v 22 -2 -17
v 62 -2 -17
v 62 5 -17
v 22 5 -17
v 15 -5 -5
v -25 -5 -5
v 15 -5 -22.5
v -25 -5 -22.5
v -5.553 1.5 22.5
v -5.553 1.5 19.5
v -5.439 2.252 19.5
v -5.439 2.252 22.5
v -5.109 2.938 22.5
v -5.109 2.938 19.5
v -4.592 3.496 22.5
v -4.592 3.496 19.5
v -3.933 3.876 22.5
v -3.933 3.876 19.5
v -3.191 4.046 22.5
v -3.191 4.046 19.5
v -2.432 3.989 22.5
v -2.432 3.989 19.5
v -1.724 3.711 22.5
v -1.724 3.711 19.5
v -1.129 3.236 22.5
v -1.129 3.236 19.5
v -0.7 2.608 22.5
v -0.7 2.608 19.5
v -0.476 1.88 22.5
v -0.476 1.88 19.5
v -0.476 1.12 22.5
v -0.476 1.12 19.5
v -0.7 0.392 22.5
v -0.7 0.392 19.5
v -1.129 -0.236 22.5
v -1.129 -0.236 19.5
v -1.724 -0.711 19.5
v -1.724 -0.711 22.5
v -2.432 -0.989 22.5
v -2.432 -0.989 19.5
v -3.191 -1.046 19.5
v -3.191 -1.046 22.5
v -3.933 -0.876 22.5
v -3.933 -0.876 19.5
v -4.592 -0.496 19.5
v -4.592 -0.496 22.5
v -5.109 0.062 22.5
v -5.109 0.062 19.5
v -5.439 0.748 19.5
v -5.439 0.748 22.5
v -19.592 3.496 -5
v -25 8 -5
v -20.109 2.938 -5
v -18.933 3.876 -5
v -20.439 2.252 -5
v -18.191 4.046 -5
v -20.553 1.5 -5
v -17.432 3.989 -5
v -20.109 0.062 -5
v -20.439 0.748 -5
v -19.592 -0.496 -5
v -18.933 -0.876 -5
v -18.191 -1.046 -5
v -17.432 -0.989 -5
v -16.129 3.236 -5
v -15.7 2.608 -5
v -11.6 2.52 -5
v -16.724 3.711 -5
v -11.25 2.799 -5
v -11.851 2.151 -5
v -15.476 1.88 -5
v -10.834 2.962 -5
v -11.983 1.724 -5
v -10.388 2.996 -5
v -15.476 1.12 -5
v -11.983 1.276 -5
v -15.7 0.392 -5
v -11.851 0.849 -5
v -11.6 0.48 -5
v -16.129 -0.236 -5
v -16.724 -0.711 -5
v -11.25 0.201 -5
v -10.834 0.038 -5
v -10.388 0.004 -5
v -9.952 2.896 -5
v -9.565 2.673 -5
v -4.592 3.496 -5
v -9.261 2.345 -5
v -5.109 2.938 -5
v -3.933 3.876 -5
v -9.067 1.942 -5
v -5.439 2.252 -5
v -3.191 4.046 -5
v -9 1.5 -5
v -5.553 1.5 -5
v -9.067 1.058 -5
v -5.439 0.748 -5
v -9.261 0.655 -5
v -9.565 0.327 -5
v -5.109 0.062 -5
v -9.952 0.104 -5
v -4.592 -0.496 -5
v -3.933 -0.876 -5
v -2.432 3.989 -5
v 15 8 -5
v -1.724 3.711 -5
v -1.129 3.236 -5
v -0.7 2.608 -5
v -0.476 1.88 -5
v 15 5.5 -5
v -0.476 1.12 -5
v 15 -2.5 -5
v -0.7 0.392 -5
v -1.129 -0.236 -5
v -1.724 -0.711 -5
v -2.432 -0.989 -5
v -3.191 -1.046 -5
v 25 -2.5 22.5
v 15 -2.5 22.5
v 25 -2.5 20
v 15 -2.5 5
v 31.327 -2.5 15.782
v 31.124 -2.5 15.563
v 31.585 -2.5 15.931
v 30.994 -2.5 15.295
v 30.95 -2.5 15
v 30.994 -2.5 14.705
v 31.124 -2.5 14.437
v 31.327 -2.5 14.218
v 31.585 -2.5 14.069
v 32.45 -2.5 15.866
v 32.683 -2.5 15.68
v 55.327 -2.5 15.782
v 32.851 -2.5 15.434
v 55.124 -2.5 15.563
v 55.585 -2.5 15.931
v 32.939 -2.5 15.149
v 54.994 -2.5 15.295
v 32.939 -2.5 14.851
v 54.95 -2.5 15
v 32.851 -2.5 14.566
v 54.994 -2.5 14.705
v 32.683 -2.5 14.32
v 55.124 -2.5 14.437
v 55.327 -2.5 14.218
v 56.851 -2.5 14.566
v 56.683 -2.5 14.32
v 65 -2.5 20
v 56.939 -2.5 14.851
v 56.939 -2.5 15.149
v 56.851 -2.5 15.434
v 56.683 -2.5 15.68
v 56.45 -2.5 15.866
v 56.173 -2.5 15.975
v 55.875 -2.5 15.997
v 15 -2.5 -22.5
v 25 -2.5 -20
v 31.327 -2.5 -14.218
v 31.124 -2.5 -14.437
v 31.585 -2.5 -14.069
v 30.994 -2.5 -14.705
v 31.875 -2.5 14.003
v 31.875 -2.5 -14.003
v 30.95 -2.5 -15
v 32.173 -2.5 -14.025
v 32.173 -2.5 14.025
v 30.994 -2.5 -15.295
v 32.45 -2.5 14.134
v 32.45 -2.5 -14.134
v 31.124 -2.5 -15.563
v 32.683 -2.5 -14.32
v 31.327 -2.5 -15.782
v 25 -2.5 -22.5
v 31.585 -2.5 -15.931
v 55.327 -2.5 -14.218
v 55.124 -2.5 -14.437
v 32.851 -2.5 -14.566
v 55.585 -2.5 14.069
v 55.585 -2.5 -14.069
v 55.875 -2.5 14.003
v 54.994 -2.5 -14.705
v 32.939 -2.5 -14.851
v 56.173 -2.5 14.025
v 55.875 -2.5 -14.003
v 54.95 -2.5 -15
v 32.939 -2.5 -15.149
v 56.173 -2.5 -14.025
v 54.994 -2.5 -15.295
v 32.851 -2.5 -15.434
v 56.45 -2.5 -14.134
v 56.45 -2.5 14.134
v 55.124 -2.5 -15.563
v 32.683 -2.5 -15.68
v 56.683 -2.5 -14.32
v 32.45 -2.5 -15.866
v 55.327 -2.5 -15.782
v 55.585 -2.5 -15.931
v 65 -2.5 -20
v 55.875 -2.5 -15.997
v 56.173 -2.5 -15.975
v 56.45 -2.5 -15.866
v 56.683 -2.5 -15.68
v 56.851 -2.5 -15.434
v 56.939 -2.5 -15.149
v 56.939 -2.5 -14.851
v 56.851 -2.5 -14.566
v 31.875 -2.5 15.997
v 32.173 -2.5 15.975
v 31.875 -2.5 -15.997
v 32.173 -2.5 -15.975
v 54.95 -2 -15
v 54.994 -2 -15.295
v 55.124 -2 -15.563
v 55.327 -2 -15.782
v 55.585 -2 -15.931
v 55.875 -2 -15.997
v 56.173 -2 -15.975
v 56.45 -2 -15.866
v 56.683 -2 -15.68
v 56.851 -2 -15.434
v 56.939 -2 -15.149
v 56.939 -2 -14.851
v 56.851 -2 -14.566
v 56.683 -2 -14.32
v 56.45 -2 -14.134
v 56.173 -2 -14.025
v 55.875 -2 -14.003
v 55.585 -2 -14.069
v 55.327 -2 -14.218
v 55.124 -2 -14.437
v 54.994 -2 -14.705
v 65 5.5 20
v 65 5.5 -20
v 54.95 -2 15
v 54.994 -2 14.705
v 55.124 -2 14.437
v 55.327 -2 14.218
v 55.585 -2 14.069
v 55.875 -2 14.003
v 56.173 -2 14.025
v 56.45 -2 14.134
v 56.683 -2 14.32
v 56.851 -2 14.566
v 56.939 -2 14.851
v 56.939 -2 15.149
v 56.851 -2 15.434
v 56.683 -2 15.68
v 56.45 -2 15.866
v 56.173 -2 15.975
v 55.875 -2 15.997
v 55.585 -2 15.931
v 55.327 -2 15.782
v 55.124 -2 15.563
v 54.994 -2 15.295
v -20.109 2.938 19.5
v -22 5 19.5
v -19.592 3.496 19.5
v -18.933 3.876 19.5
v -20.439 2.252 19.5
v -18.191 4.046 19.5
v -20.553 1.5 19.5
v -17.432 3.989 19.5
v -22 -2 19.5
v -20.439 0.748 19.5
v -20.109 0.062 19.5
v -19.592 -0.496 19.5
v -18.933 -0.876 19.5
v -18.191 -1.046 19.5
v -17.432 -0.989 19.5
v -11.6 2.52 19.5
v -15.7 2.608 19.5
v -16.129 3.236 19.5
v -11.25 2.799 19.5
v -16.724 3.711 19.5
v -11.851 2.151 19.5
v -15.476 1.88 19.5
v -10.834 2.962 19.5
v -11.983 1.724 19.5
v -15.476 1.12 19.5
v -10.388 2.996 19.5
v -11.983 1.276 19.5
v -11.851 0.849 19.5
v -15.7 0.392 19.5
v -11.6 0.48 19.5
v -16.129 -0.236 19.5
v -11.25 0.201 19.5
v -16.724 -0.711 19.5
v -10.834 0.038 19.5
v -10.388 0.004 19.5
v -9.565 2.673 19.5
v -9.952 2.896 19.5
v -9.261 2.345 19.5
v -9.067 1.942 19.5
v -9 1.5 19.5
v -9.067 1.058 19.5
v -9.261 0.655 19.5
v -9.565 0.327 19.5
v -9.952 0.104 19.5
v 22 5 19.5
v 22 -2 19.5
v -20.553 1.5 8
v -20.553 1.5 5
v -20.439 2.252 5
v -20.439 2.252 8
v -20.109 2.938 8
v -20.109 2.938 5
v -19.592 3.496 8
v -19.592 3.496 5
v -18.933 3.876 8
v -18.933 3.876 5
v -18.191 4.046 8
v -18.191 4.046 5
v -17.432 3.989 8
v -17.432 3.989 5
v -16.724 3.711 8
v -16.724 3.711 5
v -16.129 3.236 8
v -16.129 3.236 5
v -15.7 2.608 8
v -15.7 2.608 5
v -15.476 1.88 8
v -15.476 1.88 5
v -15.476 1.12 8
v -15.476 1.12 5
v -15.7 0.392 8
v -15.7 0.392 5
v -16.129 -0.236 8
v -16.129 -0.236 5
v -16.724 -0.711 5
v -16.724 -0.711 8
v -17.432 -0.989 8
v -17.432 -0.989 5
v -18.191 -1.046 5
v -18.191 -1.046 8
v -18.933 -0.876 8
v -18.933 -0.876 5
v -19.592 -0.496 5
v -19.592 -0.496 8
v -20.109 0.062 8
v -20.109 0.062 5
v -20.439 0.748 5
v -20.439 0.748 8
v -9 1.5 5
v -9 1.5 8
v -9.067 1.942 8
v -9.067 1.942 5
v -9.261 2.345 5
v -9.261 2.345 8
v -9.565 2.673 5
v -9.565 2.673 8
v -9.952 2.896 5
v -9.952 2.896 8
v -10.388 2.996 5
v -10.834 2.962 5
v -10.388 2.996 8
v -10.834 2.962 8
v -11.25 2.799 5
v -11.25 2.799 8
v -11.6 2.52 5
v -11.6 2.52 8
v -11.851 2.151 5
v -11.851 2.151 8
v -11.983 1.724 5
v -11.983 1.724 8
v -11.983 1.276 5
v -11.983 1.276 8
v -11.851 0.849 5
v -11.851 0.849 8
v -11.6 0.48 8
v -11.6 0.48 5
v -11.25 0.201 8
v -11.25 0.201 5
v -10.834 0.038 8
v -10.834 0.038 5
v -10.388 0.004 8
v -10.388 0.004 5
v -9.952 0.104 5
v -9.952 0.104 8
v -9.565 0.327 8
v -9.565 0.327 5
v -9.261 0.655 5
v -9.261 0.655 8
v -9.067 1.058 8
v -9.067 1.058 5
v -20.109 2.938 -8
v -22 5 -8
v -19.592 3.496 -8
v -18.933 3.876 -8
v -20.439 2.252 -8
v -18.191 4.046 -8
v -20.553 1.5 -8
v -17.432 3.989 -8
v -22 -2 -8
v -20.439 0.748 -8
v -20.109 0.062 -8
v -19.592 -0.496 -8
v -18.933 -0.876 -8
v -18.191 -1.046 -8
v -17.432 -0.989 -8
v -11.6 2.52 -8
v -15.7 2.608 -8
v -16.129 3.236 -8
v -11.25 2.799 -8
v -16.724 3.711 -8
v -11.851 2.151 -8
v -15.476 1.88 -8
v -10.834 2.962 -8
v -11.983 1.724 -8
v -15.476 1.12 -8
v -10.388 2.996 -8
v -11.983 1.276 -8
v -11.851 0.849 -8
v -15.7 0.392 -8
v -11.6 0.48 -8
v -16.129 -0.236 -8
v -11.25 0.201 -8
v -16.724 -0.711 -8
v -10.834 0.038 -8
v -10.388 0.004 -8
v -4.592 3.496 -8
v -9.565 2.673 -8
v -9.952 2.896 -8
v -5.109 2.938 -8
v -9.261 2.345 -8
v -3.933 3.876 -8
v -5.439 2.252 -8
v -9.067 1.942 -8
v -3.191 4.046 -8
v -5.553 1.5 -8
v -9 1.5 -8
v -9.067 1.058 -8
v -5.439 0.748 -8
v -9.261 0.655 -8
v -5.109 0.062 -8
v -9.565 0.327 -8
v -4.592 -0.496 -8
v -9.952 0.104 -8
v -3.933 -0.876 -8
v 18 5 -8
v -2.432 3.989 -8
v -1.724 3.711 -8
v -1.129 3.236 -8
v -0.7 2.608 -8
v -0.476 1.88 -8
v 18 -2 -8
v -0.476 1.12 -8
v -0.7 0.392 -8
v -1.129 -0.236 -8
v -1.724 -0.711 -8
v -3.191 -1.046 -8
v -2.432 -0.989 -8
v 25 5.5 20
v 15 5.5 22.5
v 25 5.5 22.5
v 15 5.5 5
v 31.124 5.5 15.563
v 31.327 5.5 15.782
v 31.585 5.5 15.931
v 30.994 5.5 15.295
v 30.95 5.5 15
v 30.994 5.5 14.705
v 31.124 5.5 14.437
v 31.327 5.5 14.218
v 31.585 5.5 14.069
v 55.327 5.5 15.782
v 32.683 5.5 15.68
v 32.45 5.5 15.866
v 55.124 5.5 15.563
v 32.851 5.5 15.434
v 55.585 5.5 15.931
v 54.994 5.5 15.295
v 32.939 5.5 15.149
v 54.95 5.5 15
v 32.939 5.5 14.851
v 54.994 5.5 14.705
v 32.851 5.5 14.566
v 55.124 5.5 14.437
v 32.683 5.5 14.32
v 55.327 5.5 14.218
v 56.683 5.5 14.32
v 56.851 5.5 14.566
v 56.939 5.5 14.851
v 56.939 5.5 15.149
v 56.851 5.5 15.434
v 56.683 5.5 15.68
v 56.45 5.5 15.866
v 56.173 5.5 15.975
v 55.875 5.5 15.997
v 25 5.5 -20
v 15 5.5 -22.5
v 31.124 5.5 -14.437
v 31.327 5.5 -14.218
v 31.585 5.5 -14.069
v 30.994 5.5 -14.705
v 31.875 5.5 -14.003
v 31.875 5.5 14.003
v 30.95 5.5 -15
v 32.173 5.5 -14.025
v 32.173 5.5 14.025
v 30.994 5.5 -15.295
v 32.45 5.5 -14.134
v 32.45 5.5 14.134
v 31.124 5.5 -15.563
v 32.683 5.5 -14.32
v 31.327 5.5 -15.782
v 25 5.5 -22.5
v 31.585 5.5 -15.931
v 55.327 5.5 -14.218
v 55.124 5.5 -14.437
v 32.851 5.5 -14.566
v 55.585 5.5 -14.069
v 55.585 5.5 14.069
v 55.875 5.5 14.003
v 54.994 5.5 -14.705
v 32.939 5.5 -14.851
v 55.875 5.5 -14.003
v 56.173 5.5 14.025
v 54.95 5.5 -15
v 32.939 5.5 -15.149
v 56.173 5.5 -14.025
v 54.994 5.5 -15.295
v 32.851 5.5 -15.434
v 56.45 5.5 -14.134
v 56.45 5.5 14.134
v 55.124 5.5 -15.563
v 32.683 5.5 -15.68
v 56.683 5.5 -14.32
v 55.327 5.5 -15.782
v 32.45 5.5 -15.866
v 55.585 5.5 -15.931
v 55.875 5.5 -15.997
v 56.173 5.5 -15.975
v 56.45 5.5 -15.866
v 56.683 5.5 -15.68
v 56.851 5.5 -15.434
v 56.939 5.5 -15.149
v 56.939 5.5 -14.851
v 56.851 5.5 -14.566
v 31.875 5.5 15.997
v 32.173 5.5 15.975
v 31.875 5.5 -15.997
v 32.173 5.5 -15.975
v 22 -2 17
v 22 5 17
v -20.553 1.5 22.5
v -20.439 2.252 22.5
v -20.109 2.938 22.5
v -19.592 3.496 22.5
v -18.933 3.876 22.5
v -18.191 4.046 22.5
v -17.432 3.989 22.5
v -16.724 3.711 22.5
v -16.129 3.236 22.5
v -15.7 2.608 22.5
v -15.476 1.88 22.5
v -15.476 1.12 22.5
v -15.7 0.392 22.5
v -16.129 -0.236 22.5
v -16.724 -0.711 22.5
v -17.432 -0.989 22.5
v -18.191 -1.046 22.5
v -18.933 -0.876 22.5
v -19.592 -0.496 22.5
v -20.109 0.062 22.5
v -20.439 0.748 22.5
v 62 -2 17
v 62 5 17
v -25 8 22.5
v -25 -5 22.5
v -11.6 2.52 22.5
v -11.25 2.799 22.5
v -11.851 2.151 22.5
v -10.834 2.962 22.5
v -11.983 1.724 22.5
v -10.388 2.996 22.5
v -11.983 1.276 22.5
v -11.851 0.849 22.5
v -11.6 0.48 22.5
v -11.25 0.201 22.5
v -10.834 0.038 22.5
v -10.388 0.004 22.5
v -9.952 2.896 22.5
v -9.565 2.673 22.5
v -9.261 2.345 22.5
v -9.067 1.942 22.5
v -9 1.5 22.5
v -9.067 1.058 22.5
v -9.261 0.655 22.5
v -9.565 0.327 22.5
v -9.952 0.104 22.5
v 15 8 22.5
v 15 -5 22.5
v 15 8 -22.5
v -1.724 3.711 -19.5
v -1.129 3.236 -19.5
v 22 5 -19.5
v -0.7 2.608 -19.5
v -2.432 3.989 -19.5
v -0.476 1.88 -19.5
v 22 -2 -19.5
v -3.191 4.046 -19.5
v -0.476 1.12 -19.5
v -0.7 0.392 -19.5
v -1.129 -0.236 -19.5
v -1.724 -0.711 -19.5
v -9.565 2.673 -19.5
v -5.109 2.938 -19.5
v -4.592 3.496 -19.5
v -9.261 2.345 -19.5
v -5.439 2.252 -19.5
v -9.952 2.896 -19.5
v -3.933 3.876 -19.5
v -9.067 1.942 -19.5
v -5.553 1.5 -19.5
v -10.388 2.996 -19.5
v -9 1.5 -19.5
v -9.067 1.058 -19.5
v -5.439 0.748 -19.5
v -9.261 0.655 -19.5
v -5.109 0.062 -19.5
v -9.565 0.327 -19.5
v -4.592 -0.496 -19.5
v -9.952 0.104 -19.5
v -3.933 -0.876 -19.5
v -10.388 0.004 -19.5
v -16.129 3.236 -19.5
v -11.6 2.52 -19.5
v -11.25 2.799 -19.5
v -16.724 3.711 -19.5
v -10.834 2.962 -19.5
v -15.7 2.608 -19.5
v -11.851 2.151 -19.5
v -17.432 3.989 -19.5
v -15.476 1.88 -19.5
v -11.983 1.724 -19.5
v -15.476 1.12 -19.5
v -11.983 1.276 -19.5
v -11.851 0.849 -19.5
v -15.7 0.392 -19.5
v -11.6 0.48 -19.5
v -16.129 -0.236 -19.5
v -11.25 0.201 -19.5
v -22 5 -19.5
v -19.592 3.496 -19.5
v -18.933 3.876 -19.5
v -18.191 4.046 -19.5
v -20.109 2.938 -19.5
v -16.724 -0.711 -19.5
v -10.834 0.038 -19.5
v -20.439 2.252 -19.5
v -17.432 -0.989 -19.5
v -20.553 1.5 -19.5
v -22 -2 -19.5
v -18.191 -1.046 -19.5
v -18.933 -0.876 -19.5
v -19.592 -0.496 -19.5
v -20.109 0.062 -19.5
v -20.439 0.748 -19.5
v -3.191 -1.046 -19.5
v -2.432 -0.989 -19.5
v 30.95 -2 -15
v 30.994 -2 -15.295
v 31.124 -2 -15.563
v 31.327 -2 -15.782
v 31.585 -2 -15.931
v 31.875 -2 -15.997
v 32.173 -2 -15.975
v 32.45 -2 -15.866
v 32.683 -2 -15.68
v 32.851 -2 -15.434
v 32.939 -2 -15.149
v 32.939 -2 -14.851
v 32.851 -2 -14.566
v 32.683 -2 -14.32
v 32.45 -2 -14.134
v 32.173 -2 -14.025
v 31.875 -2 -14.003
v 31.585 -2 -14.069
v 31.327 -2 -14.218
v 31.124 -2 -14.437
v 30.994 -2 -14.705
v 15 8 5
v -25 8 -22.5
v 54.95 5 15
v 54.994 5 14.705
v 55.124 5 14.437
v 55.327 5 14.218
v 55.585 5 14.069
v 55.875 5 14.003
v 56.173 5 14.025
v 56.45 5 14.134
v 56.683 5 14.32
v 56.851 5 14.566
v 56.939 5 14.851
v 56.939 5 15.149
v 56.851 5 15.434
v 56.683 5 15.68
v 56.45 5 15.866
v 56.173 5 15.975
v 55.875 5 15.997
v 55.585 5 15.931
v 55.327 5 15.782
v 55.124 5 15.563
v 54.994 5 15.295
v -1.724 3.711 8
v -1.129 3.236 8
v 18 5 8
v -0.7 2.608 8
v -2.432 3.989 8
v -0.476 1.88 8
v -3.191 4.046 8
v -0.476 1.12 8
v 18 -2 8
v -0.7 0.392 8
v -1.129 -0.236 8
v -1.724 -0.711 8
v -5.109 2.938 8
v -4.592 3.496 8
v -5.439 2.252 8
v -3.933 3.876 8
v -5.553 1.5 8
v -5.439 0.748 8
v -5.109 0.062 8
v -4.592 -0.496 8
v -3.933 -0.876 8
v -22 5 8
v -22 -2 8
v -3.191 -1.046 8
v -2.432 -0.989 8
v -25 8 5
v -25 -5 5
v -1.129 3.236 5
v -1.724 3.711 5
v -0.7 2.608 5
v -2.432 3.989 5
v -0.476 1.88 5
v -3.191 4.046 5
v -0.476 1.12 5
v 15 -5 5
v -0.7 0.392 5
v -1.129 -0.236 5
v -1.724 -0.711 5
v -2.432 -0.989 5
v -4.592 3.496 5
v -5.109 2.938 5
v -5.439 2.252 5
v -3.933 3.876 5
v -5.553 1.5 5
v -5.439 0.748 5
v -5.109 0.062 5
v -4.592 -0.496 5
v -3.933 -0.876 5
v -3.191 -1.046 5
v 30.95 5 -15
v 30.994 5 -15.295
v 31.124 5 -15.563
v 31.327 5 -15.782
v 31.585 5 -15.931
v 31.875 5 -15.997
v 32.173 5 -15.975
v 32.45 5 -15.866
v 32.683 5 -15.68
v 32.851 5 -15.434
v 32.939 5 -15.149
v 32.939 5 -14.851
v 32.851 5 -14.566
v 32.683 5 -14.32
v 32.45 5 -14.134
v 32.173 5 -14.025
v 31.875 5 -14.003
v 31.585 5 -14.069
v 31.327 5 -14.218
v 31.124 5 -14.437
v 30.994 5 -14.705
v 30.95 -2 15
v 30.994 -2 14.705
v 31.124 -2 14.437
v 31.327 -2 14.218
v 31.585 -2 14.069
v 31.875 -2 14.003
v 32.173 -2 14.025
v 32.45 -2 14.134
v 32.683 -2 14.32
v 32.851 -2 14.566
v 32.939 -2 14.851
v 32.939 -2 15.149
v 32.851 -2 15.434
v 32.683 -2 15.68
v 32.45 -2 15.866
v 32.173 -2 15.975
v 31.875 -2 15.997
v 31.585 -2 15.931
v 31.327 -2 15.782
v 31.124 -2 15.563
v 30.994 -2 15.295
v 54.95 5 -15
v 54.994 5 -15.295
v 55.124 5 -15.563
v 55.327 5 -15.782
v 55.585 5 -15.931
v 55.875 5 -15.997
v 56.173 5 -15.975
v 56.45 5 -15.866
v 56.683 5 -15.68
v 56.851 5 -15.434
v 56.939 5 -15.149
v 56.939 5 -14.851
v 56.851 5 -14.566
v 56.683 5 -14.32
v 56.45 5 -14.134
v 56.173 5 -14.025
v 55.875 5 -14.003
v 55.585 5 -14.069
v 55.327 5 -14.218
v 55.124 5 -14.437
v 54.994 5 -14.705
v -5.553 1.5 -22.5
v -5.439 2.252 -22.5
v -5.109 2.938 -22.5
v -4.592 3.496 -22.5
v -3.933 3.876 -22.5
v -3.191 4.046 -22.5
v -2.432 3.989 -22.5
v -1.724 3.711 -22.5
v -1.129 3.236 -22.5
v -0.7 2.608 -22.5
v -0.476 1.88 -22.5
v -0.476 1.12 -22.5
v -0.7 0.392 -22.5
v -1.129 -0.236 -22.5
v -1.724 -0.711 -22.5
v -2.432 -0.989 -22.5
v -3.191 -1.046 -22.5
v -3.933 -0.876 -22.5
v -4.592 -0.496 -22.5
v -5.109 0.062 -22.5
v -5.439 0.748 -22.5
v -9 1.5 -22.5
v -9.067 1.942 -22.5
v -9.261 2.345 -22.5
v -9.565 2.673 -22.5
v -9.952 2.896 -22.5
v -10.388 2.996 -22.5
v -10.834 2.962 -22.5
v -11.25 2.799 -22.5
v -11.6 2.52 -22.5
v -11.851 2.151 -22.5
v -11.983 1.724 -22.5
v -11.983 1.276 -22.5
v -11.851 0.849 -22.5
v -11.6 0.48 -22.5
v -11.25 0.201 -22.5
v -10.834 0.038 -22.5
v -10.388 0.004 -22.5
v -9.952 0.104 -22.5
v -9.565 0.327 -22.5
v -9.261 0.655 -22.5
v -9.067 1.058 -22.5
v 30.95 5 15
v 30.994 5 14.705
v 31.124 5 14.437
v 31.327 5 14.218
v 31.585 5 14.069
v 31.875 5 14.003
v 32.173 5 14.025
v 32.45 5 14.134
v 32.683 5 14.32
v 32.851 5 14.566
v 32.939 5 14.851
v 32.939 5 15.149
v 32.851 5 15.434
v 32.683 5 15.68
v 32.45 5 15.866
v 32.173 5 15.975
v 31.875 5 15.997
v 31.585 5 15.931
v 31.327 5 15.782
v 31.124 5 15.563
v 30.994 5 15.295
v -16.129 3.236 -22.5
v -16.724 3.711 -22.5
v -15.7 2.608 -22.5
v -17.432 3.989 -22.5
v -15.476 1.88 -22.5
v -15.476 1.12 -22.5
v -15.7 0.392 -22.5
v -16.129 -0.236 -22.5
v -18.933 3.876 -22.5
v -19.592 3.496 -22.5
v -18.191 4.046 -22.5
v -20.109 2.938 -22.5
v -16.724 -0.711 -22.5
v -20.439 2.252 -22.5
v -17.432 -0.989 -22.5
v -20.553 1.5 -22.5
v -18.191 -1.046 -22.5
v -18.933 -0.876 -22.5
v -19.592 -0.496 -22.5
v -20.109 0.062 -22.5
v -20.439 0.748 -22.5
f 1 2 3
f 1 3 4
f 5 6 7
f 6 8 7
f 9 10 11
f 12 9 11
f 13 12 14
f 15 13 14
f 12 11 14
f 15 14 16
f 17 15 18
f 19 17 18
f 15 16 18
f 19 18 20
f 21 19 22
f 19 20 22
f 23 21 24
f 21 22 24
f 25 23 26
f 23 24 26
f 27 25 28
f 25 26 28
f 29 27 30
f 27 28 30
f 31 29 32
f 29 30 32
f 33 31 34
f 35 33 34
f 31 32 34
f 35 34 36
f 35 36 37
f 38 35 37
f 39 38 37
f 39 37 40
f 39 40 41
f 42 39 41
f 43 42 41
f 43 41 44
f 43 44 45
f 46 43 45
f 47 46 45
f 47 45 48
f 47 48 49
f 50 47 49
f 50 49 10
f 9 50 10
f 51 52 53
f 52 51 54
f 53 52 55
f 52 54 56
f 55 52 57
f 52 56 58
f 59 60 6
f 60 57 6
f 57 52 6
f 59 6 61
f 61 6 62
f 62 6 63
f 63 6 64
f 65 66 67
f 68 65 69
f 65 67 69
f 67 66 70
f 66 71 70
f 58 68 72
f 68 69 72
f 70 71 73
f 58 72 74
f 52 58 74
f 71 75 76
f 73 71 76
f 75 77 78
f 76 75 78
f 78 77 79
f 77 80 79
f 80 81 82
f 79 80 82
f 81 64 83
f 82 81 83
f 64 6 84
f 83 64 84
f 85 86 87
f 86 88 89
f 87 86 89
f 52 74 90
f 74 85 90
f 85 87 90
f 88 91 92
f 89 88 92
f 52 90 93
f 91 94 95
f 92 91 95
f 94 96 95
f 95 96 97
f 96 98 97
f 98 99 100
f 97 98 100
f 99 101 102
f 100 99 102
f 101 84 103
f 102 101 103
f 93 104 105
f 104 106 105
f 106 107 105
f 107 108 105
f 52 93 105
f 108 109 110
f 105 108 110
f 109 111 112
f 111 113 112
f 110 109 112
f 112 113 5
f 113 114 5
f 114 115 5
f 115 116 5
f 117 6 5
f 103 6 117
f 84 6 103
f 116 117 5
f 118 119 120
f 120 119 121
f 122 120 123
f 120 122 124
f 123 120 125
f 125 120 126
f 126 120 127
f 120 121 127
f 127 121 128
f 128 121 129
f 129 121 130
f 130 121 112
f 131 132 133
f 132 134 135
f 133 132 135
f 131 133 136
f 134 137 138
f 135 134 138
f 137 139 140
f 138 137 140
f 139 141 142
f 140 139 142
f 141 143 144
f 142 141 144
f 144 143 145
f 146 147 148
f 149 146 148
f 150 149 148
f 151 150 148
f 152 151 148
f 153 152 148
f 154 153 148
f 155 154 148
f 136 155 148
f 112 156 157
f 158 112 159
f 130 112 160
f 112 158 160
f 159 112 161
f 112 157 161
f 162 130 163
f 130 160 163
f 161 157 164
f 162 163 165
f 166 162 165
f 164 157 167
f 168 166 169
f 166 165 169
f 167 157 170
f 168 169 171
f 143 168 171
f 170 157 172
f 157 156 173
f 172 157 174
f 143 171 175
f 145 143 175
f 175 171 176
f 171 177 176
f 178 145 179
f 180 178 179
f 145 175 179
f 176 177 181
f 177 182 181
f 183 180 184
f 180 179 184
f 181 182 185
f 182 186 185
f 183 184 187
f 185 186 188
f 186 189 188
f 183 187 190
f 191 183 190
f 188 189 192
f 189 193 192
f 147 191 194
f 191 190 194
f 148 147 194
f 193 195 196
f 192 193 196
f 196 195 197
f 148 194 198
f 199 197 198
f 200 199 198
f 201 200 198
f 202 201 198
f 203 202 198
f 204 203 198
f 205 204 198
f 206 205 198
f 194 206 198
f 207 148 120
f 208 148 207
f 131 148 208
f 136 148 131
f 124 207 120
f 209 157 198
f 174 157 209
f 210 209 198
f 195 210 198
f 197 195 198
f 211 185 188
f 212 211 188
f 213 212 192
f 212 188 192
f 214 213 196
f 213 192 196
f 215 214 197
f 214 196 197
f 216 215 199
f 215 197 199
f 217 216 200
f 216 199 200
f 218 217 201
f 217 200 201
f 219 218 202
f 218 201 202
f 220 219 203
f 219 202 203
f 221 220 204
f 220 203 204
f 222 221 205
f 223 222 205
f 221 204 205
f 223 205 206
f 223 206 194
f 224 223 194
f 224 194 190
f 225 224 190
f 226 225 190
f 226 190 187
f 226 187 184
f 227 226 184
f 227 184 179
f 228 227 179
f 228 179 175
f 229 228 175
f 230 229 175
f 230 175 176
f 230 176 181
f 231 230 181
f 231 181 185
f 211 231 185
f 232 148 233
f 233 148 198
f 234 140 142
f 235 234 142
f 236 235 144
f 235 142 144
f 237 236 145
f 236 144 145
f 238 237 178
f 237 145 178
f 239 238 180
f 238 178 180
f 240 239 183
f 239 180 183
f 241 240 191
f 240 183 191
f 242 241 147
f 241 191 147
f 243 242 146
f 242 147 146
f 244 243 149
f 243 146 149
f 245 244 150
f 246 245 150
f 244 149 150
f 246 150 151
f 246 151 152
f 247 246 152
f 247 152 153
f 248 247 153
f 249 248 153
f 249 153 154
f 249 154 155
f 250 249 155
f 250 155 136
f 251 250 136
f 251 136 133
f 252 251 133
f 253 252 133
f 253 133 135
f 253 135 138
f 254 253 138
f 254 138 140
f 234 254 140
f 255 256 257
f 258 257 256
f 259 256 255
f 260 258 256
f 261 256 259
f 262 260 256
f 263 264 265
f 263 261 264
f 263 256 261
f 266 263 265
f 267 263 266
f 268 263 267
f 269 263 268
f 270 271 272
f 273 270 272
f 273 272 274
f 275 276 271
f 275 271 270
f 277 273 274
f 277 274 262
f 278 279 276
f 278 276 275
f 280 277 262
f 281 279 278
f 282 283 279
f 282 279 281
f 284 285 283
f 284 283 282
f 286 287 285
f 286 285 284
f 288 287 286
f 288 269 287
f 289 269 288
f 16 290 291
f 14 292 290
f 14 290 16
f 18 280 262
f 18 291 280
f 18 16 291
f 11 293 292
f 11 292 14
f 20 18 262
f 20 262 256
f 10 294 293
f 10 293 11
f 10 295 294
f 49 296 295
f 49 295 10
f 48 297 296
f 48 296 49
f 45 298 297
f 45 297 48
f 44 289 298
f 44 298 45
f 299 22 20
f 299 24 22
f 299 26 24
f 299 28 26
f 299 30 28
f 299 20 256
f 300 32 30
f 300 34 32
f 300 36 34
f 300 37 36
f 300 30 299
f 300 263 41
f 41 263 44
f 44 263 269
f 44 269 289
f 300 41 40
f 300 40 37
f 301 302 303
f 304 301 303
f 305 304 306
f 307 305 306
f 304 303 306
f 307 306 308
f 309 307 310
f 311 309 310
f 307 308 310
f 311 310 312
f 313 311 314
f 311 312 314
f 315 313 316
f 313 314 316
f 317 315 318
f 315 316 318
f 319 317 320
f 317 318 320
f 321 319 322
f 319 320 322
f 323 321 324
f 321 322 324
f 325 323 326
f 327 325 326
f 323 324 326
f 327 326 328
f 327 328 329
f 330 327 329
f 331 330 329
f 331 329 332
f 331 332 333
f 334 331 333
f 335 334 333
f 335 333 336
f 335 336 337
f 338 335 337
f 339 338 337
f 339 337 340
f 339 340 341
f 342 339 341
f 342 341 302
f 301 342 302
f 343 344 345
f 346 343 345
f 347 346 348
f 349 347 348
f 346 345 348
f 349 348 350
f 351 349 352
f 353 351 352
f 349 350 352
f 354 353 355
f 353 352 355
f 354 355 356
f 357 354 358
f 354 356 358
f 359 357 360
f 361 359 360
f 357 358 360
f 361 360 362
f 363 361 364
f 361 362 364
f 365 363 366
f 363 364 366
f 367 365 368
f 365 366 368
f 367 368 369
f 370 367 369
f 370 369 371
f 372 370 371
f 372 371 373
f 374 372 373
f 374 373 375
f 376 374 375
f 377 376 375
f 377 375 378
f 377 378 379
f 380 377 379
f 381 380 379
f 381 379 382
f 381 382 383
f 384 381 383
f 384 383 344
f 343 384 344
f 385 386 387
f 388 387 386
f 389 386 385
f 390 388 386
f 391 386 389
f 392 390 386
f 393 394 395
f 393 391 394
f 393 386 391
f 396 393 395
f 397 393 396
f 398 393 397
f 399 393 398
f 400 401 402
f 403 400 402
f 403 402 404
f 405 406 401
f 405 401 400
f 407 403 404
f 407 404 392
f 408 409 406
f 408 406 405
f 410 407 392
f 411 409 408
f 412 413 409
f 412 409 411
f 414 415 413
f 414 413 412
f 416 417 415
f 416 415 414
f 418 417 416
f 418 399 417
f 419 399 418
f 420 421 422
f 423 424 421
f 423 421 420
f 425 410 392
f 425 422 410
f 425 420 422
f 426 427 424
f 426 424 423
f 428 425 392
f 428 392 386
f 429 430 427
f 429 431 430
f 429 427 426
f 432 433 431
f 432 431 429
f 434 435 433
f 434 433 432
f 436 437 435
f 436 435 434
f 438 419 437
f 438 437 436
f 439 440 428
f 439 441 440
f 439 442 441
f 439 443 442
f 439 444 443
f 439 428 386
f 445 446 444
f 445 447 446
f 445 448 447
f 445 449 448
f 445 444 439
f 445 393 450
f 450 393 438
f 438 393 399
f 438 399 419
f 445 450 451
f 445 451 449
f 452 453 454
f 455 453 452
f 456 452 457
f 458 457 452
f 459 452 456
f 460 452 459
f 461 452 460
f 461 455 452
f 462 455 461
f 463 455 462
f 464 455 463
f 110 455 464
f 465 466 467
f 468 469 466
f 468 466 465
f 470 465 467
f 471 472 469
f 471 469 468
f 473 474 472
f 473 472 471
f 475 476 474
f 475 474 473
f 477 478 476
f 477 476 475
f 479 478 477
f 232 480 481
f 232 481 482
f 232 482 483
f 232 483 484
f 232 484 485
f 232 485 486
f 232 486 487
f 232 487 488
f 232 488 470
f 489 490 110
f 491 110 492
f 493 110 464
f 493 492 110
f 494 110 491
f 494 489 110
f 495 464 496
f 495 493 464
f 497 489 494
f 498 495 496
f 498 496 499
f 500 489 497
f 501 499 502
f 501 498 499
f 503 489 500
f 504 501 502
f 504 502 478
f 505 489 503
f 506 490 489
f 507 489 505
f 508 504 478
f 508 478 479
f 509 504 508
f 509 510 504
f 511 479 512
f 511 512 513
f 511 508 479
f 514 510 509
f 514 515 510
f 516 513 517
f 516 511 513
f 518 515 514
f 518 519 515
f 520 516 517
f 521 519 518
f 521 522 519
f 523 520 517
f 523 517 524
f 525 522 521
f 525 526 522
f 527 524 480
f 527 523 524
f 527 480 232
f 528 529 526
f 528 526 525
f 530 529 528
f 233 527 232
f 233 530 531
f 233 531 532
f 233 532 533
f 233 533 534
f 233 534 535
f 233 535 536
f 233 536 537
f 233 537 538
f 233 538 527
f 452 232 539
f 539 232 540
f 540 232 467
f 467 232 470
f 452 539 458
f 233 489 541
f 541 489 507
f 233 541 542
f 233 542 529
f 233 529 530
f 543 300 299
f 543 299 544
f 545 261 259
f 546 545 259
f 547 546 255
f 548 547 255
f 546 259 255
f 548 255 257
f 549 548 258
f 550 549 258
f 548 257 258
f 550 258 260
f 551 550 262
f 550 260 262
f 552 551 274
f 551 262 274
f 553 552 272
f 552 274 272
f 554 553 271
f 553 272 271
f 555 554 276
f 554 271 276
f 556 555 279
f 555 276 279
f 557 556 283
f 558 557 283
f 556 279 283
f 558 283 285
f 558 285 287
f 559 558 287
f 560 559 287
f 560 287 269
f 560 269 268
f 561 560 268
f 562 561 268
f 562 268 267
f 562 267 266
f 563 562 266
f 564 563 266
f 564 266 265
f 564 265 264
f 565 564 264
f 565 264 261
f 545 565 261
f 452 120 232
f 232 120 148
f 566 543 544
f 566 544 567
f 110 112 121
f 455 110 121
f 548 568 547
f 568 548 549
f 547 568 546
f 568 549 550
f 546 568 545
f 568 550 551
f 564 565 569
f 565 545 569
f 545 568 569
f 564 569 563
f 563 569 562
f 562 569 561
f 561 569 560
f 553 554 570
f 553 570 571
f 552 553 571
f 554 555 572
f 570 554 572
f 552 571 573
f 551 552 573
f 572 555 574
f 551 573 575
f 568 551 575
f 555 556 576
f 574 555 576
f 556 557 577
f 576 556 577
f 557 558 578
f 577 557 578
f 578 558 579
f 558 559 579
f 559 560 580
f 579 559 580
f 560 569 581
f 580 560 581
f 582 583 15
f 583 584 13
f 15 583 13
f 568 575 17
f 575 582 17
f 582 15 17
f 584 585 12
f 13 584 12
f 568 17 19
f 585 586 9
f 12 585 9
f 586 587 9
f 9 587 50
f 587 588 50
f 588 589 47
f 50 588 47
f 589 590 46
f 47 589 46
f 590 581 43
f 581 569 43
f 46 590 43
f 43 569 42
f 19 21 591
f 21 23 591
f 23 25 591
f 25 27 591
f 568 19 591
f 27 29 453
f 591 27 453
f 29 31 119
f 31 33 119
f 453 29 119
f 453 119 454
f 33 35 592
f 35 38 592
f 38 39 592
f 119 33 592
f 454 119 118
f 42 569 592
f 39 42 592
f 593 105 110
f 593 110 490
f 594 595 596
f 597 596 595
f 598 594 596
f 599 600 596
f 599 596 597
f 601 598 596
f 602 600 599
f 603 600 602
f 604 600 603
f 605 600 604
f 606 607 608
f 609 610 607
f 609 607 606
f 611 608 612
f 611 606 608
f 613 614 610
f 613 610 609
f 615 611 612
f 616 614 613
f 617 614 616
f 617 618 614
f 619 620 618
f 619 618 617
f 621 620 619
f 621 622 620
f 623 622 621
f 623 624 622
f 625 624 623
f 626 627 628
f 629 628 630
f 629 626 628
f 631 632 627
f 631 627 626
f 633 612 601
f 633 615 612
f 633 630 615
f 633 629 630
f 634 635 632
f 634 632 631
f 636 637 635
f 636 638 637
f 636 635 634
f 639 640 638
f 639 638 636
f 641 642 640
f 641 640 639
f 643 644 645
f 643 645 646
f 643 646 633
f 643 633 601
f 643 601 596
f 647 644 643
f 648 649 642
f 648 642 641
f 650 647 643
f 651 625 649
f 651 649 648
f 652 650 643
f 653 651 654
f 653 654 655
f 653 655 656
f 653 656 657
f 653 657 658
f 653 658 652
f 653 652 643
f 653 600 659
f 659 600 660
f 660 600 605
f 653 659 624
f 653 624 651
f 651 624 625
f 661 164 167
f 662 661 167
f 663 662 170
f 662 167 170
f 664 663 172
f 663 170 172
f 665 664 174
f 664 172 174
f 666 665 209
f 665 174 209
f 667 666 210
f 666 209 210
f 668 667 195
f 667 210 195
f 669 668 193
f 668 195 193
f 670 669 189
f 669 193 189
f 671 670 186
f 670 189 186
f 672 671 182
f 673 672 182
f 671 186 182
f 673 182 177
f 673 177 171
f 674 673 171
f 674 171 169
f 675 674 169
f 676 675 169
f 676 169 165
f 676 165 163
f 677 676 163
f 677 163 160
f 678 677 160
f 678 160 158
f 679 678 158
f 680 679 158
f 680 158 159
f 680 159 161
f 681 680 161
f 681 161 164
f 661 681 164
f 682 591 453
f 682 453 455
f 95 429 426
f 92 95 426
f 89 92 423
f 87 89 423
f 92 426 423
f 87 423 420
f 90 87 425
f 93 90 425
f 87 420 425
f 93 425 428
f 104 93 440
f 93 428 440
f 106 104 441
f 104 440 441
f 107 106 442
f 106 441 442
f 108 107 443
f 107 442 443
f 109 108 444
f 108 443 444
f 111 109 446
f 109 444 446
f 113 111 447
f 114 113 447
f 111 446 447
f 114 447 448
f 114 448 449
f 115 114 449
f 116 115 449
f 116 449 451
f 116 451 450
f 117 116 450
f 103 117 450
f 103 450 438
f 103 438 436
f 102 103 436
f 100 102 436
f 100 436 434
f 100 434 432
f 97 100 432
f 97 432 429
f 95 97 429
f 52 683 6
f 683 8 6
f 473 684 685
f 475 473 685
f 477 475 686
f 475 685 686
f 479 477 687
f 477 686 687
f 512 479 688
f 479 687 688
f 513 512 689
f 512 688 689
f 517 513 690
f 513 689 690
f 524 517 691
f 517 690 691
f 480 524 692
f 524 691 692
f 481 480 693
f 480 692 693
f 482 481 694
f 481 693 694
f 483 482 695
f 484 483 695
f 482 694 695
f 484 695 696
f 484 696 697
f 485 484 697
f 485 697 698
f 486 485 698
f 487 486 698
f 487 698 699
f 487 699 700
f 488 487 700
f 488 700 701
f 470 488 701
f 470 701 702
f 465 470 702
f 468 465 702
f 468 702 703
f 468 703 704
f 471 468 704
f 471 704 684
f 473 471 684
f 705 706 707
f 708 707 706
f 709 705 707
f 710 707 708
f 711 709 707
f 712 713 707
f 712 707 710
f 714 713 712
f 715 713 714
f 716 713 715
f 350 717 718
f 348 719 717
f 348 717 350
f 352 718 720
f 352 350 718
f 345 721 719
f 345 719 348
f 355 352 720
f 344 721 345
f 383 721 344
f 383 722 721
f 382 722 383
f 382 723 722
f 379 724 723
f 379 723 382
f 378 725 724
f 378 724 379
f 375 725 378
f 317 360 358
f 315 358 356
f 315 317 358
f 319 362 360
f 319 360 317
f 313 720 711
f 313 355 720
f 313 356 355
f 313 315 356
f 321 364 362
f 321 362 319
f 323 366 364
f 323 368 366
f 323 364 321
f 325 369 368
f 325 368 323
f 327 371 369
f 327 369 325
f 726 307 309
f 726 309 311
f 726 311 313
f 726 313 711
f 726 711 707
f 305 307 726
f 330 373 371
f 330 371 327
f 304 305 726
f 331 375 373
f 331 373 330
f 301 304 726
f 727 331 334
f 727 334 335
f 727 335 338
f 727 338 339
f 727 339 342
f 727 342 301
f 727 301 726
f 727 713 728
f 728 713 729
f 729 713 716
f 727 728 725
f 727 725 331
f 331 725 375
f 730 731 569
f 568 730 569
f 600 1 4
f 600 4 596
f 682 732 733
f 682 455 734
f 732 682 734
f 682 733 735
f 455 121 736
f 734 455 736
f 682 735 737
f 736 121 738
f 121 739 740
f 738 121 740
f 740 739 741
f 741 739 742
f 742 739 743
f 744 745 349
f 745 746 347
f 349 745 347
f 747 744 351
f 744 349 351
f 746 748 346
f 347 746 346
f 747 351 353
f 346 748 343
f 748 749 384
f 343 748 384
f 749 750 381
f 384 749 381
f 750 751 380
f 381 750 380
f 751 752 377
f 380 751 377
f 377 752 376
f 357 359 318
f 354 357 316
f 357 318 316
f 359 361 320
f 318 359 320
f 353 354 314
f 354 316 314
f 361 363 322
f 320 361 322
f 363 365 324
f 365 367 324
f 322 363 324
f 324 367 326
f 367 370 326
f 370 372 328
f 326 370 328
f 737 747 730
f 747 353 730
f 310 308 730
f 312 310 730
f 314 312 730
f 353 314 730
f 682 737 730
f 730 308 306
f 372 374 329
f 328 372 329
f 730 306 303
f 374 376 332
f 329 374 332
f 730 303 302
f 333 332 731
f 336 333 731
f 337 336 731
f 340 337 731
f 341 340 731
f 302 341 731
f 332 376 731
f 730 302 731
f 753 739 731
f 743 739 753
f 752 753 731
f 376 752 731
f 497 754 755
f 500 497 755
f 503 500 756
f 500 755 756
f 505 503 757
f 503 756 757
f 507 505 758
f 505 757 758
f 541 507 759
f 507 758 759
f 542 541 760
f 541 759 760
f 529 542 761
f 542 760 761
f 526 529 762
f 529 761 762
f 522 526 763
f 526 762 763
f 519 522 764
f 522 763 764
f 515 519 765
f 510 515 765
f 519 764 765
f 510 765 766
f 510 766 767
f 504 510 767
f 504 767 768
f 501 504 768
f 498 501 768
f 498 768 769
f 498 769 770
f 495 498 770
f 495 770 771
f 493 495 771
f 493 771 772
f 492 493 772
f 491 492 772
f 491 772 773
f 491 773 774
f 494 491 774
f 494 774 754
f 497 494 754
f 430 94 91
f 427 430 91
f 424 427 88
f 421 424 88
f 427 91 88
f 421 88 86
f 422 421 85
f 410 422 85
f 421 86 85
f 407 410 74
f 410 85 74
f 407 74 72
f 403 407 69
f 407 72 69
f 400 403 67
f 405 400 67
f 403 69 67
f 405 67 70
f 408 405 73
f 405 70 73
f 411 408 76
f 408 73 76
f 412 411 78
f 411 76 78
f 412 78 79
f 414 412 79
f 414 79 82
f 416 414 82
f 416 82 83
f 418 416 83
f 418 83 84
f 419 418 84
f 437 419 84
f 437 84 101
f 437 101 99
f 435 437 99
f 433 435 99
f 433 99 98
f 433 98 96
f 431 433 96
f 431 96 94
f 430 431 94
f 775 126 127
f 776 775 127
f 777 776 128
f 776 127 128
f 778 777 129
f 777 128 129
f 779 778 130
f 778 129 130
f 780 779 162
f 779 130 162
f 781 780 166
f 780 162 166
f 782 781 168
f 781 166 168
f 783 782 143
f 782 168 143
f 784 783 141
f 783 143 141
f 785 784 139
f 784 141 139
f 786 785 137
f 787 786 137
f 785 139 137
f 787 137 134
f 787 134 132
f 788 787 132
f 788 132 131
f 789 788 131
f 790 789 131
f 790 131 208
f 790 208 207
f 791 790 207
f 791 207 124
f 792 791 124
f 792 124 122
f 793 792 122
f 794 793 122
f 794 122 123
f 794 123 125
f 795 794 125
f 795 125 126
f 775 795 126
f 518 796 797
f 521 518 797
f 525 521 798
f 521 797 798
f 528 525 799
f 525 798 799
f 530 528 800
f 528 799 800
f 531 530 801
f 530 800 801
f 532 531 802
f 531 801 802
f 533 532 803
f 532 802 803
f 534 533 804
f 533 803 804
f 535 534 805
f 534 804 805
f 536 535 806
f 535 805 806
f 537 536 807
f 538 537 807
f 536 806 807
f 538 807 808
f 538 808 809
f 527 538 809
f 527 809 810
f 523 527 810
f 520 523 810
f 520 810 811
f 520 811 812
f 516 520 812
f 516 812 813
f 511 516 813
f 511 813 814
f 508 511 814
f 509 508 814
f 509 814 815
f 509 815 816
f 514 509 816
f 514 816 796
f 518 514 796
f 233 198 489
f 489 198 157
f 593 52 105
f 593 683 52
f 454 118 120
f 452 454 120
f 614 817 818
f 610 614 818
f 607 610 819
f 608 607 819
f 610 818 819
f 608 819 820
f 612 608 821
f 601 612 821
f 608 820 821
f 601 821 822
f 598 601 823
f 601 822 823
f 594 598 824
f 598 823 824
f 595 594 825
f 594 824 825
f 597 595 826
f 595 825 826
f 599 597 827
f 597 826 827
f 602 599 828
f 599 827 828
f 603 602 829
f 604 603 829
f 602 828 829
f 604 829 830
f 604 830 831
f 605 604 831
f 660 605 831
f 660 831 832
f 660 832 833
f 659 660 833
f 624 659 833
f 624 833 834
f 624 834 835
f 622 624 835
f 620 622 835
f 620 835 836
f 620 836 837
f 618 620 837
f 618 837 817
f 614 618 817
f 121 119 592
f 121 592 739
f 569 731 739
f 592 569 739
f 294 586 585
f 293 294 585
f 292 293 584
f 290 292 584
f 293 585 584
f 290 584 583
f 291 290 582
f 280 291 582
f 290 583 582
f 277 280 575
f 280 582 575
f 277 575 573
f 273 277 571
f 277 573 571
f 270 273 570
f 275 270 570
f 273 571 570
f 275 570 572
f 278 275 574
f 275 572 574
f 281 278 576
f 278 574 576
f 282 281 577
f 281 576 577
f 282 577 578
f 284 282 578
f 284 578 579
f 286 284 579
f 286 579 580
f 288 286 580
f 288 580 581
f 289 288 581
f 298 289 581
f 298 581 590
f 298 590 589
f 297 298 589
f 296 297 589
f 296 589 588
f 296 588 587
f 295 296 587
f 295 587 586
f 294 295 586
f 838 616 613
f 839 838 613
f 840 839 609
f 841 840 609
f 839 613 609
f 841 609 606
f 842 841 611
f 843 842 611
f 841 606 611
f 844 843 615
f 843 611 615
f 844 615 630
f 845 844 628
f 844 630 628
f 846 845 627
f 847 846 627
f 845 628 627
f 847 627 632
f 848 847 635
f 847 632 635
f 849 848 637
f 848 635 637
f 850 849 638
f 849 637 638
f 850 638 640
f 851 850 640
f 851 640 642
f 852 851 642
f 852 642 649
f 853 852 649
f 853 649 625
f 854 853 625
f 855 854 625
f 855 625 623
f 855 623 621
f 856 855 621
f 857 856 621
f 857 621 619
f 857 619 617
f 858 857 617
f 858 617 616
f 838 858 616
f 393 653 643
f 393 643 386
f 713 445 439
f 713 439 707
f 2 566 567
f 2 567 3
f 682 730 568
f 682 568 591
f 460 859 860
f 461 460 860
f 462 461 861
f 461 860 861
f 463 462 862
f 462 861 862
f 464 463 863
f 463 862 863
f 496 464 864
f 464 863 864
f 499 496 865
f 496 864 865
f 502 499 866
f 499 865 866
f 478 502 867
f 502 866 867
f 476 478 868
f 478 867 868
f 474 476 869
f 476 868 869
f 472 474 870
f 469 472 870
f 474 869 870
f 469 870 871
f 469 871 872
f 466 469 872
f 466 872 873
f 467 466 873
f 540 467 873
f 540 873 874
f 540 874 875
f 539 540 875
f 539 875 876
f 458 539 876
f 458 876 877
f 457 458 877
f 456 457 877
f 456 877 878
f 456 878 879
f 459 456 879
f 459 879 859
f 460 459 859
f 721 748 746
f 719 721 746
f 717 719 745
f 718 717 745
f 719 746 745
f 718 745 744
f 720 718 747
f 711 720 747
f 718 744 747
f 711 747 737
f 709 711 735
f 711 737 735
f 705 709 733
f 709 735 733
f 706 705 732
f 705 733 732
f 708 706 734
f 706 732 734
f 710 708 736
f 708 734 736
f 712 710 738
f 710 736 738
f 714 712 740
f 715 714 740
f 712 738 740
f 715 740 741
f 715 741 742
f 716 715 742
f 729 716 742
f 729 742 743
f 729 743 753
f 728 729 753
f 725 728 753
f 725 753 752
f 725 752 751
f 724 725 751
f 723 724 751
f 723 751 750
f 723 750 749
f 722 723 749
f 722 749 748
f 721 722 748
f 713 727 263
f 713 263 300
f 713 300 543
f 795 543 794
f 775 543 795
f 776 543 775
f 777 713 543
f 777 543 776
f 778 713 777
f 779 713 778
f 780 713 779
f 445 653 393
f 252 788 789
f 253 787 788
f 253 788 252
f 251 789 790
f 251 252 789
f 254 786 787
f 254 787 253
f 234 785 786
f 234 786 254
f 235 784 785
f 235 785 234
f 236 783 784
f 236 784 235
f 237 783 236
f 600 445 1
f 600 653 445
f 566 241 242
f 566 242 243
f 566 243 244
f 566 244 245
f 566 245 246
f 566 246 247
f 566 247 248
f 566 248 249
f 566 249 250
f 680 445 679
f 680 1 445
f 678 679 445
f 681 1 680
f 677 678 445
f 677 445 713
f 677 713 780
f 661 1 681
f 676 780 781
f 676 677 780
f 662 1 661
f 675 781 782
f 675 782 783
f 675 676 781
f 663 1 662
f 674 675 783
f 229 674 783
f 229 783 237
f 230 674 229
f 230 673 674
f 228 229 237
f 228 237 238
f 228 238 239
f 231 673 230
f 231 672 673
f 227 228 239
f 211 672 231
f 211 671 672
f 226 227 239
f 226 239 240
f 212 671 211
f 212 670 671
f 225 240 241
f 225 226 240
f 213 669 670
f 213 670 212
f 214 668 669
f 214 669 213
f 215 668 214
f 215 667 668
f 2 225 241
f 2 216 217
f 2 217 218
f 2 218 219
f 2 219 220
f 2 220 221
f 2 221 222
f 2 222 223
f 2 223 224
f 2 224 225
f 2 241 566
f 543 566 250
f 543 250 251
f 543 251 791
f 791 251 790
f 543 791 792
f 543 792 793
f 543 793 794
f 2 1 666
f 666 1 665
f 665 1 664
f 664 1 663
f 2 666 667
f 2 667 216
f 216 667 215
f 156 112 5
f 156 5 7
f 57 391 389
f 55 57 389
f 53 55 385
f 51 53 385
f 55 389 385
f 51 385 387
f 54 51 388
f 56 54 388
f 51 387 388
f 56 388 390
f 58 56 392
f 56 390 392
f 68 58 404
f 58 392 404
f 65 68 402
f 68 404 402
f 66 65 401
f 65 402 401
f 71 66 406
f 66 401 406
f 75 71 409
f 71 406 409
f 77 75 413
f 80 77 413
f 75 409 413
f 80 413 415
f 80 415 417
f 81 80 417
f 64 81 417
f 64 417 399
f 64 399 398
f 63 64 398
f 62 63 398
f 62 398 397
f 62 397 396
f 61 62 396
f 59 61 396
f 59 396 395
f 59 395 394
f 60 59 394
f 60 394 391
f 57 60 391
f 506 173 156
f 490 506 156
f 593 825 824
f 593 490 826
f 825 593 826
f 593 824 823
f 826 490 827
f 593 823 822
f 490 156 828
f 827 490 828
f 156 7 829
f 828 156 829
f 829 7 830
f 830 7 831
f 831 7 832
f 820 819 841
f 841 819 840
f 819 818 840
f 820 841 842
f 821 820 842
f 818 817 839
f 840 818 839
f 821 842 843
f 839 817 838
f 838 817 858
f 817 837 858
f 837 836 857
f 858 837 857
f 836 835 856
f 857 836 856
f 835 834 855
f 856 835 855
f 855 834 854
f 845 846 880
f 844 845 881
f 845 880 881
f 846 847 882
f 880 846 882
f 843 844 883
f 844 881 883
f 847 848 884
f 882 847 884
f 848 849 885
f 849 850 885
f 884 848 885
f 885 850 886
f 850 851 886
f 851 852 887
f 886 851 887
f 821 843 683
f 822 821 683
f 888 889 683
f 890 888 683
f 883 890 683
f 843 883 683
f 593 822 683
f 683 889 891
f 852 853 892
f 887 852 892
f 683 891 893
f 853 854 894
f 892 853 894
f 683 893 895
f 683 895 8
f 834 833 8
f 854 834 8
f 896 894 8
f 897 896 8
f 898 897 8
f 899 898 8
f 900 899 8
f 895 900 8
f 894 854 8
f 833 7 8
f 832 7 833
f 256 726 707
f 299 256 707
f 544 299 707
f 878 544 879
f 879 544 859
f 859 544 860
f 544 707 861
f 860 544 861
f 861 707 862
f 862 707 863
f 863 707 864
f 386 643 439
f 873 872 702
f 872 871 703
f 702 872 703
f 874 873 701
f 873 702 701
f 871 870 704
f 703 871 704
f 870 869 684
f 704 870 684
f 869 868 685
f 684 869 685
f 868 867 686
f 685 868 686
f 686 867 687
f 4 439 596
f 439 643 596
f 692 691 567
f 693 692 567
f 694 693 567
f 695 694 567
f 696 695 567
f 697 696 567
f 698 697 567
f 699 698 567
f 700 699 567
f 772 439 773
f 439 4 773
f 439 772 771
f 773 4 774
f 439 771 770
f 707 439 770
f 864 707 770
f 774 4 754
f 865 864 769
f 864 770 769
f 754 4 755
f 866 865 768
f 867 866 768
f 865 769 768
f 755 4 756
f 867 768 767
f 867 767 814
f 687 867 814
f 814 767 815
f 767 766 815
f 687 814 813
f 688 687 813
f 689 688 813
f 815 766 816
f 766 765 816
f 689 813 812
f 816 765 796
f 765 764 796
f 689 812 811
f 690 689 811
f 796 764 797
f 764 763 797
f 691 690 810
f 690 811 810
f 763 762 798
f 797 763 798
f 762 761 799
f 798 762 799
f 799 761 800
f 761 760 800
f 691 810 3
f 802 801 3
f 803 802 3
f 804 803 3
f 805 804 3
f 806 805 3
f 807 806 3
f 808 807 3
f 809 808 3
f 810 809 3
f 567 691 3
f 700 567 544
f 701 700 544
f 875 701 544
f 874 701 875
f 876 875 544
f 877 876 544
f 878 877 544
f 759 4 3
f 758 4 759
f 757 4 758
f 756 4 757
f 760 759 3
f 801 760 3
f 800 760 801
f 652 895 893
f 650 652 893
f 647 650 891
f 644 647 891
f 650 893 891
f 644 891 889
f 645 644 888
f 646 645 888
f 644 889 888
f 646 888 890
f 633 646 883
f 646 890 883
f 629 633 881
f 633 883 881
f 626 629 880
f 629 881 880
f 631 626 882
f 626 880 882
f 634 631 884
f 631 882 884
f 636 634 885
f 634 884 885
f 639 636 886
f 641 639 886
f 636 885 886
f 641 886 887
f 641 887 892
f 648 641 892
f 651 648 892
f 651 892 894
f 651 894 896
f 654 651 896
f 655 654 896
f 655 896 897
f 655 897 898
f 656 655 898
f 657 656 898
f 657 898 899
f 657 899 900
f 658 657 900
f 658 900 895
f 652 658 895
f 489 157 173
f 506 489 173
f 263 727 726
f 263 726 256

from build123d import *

# Parameters (mm, degrees)
BOSS_EXTRUDE1_DEPTH             = 5
BOSS_EXTRUDE1_DEPTH_BACK        = 5
SHELL1_T                        = -3
BOSS_EXTRUDE2_START             = 5
BOSS_EXTRUDE2_DEPTH             = 3
SKETCH2_R                       = 1.5
CUT_EXTRUDE1_DEPTH              = 100
F_1_4_20_TAPPED_HOLE1_D         = 5.1054
SKETCH9_W                       = 40
SKETCH9_H                       = 2.5
CUT_EXTRUDE2_DEPTH              = 79.072082078
SKETCH10_W                      = 10
SKETCH10_H                      = 45
CUT_EXTRUDE3_DEPTH              = 2.5
CUT_EXTRUDE4_START              = -10.5
SKETCH10_2_W                    = 10
SKETCH10_2_H                    = 45
CUT_EXTRUDE4_DEPTH              = 2.5
F_2_0MM_CLEARANCE_DOWEL_HOLE2_D = 2


with BuildPart() as part:
    # Sketch1 → Boss-Extrude1 (new, two sides: drawn at the far end of the back side and taken through both)
    with BuildSketch(Plane(origin=(0, 0, 0), x_dir=(1, 0, 0), z_dir=(0, 1, 0)).offset(-BOSS_EXTRUDE1_DEPTH_BACK)):
        Polygon((-25, -5), (-25, -22.5), (25, -22.5), (25, -20), (65, -20), (65, 20), (25, 20), (25, 22.5), (-25, 22.5), (-25, 5), (15, 5), (15, -5), align=None)
    extrude(amount=BOSS_EXTRUDE1_DEPTH + BOSS_EXTRUDE1_DEPTH_BACK)

    # Shell1
    shell1_openings = [part.faces().sort_by_distance(p)[0] for p in [
        (21.449275362, 5, 0),
    ]]
    offset(amount=SHELL1_T, openings=shell1_openings, kind=Kind.INTERSECTION)

    # Sketch1<2> → Boss-Extrude2 (add)
    with BuildSketch(Plane(origin=(0, 0, 0), x_dir=(1, 0, 0), z_dir=(0, 1, 0)).offset(BOSS_EXTRUDE2_START)):
        Polygon((-25, -5), (-25, -22.5), (25, -22.5), (25, -20), (65, -20), (65, 20), (25, 20), (25, 22.5), (-25, 22.5), (-25, 5), (15, 5), (15, -5), align=None)
    extrude(amount=BOSS_EXTRUDE2_DEPTH)

    # Sketch2 → Cut-Extrude1 (cut)
    with BuildSketch(Plane.XY.offset(22.5)):
        with Locations((-10.5, 1.5)):
            Circle(SKETCH2_R)
    extrude(amount=-CUT_EXTRUDE1_DEPTH, mode=Mode.SUBTRACT)

    # 1/4-20 Tapped Hole1 (through all)
    with Locations(Plane.XY.offset(22.5)):
        with Locations((-3, 1.5), (-18, 1.5)):
            Hole(F_1_4_20_TAPPED_HOLE1_D / 2)

    # Sketch9 → Cut-Extrude2 (cut, through all)
    with BuildSketch(Plane.XY.offset(20)):
        with Locations((45, 6.75)):
            Rectangle(SKETCH9_W, SKETCH9_H)
        with Locations((45, -3.75)):
            Rectangle(SKETCH9_W, SKETCH9_H)
    extrude(amount=-CUT_EXTRUDE2_DEPTH, mode=Mode.SUBTRACT)

    # Sketch10 → Cut-Extrude3 (cut)
    with BuildSketch(Plane(origin=(0, 8, 0), x_dir=(1, 0, 0), z_dir=(0, 1, 0))):
        with Locations((20, 0)):
            Rectangle(SKETCH10_W, SKETCH10_H)
    extrude(amount=-CUT_EXTRUDE3_DEPTH, mode=Mode.SUBTRACT)

    # Sketch10<2> → Cut-Extrude4 (cut)
    with BuildSketch(Plane(origin=(0, 8, 0), x_dir=(1, 0, 0), z_dir=(0, 1, 0)).offset(CUT_EXTRUDE4_START)):
        with Locations((20, 0)):
            Rectangle(SKETCH10_2_W, SKETCH10_2_H)
    extrude(amount=-CUT_EXTRUDE4_DEPTH, mode=Mode.SUBTRACT)

    # Ø2.0mm Clearance Dowel Hole2 (through all)
    with Locations(Plane(origin=(0, 5.5, 0), x_dir=(1, 0, 0), z_dir=(0, 1, 0))):
        with Locations((31.950000364, 15), (31.950000364, -15), (55.950000364, -15), (55.950000364, 15)):
            Hole(F_2_0MM_CLEARANCE_DOWEL_HOLE2_D / 2)


solid = part.part
